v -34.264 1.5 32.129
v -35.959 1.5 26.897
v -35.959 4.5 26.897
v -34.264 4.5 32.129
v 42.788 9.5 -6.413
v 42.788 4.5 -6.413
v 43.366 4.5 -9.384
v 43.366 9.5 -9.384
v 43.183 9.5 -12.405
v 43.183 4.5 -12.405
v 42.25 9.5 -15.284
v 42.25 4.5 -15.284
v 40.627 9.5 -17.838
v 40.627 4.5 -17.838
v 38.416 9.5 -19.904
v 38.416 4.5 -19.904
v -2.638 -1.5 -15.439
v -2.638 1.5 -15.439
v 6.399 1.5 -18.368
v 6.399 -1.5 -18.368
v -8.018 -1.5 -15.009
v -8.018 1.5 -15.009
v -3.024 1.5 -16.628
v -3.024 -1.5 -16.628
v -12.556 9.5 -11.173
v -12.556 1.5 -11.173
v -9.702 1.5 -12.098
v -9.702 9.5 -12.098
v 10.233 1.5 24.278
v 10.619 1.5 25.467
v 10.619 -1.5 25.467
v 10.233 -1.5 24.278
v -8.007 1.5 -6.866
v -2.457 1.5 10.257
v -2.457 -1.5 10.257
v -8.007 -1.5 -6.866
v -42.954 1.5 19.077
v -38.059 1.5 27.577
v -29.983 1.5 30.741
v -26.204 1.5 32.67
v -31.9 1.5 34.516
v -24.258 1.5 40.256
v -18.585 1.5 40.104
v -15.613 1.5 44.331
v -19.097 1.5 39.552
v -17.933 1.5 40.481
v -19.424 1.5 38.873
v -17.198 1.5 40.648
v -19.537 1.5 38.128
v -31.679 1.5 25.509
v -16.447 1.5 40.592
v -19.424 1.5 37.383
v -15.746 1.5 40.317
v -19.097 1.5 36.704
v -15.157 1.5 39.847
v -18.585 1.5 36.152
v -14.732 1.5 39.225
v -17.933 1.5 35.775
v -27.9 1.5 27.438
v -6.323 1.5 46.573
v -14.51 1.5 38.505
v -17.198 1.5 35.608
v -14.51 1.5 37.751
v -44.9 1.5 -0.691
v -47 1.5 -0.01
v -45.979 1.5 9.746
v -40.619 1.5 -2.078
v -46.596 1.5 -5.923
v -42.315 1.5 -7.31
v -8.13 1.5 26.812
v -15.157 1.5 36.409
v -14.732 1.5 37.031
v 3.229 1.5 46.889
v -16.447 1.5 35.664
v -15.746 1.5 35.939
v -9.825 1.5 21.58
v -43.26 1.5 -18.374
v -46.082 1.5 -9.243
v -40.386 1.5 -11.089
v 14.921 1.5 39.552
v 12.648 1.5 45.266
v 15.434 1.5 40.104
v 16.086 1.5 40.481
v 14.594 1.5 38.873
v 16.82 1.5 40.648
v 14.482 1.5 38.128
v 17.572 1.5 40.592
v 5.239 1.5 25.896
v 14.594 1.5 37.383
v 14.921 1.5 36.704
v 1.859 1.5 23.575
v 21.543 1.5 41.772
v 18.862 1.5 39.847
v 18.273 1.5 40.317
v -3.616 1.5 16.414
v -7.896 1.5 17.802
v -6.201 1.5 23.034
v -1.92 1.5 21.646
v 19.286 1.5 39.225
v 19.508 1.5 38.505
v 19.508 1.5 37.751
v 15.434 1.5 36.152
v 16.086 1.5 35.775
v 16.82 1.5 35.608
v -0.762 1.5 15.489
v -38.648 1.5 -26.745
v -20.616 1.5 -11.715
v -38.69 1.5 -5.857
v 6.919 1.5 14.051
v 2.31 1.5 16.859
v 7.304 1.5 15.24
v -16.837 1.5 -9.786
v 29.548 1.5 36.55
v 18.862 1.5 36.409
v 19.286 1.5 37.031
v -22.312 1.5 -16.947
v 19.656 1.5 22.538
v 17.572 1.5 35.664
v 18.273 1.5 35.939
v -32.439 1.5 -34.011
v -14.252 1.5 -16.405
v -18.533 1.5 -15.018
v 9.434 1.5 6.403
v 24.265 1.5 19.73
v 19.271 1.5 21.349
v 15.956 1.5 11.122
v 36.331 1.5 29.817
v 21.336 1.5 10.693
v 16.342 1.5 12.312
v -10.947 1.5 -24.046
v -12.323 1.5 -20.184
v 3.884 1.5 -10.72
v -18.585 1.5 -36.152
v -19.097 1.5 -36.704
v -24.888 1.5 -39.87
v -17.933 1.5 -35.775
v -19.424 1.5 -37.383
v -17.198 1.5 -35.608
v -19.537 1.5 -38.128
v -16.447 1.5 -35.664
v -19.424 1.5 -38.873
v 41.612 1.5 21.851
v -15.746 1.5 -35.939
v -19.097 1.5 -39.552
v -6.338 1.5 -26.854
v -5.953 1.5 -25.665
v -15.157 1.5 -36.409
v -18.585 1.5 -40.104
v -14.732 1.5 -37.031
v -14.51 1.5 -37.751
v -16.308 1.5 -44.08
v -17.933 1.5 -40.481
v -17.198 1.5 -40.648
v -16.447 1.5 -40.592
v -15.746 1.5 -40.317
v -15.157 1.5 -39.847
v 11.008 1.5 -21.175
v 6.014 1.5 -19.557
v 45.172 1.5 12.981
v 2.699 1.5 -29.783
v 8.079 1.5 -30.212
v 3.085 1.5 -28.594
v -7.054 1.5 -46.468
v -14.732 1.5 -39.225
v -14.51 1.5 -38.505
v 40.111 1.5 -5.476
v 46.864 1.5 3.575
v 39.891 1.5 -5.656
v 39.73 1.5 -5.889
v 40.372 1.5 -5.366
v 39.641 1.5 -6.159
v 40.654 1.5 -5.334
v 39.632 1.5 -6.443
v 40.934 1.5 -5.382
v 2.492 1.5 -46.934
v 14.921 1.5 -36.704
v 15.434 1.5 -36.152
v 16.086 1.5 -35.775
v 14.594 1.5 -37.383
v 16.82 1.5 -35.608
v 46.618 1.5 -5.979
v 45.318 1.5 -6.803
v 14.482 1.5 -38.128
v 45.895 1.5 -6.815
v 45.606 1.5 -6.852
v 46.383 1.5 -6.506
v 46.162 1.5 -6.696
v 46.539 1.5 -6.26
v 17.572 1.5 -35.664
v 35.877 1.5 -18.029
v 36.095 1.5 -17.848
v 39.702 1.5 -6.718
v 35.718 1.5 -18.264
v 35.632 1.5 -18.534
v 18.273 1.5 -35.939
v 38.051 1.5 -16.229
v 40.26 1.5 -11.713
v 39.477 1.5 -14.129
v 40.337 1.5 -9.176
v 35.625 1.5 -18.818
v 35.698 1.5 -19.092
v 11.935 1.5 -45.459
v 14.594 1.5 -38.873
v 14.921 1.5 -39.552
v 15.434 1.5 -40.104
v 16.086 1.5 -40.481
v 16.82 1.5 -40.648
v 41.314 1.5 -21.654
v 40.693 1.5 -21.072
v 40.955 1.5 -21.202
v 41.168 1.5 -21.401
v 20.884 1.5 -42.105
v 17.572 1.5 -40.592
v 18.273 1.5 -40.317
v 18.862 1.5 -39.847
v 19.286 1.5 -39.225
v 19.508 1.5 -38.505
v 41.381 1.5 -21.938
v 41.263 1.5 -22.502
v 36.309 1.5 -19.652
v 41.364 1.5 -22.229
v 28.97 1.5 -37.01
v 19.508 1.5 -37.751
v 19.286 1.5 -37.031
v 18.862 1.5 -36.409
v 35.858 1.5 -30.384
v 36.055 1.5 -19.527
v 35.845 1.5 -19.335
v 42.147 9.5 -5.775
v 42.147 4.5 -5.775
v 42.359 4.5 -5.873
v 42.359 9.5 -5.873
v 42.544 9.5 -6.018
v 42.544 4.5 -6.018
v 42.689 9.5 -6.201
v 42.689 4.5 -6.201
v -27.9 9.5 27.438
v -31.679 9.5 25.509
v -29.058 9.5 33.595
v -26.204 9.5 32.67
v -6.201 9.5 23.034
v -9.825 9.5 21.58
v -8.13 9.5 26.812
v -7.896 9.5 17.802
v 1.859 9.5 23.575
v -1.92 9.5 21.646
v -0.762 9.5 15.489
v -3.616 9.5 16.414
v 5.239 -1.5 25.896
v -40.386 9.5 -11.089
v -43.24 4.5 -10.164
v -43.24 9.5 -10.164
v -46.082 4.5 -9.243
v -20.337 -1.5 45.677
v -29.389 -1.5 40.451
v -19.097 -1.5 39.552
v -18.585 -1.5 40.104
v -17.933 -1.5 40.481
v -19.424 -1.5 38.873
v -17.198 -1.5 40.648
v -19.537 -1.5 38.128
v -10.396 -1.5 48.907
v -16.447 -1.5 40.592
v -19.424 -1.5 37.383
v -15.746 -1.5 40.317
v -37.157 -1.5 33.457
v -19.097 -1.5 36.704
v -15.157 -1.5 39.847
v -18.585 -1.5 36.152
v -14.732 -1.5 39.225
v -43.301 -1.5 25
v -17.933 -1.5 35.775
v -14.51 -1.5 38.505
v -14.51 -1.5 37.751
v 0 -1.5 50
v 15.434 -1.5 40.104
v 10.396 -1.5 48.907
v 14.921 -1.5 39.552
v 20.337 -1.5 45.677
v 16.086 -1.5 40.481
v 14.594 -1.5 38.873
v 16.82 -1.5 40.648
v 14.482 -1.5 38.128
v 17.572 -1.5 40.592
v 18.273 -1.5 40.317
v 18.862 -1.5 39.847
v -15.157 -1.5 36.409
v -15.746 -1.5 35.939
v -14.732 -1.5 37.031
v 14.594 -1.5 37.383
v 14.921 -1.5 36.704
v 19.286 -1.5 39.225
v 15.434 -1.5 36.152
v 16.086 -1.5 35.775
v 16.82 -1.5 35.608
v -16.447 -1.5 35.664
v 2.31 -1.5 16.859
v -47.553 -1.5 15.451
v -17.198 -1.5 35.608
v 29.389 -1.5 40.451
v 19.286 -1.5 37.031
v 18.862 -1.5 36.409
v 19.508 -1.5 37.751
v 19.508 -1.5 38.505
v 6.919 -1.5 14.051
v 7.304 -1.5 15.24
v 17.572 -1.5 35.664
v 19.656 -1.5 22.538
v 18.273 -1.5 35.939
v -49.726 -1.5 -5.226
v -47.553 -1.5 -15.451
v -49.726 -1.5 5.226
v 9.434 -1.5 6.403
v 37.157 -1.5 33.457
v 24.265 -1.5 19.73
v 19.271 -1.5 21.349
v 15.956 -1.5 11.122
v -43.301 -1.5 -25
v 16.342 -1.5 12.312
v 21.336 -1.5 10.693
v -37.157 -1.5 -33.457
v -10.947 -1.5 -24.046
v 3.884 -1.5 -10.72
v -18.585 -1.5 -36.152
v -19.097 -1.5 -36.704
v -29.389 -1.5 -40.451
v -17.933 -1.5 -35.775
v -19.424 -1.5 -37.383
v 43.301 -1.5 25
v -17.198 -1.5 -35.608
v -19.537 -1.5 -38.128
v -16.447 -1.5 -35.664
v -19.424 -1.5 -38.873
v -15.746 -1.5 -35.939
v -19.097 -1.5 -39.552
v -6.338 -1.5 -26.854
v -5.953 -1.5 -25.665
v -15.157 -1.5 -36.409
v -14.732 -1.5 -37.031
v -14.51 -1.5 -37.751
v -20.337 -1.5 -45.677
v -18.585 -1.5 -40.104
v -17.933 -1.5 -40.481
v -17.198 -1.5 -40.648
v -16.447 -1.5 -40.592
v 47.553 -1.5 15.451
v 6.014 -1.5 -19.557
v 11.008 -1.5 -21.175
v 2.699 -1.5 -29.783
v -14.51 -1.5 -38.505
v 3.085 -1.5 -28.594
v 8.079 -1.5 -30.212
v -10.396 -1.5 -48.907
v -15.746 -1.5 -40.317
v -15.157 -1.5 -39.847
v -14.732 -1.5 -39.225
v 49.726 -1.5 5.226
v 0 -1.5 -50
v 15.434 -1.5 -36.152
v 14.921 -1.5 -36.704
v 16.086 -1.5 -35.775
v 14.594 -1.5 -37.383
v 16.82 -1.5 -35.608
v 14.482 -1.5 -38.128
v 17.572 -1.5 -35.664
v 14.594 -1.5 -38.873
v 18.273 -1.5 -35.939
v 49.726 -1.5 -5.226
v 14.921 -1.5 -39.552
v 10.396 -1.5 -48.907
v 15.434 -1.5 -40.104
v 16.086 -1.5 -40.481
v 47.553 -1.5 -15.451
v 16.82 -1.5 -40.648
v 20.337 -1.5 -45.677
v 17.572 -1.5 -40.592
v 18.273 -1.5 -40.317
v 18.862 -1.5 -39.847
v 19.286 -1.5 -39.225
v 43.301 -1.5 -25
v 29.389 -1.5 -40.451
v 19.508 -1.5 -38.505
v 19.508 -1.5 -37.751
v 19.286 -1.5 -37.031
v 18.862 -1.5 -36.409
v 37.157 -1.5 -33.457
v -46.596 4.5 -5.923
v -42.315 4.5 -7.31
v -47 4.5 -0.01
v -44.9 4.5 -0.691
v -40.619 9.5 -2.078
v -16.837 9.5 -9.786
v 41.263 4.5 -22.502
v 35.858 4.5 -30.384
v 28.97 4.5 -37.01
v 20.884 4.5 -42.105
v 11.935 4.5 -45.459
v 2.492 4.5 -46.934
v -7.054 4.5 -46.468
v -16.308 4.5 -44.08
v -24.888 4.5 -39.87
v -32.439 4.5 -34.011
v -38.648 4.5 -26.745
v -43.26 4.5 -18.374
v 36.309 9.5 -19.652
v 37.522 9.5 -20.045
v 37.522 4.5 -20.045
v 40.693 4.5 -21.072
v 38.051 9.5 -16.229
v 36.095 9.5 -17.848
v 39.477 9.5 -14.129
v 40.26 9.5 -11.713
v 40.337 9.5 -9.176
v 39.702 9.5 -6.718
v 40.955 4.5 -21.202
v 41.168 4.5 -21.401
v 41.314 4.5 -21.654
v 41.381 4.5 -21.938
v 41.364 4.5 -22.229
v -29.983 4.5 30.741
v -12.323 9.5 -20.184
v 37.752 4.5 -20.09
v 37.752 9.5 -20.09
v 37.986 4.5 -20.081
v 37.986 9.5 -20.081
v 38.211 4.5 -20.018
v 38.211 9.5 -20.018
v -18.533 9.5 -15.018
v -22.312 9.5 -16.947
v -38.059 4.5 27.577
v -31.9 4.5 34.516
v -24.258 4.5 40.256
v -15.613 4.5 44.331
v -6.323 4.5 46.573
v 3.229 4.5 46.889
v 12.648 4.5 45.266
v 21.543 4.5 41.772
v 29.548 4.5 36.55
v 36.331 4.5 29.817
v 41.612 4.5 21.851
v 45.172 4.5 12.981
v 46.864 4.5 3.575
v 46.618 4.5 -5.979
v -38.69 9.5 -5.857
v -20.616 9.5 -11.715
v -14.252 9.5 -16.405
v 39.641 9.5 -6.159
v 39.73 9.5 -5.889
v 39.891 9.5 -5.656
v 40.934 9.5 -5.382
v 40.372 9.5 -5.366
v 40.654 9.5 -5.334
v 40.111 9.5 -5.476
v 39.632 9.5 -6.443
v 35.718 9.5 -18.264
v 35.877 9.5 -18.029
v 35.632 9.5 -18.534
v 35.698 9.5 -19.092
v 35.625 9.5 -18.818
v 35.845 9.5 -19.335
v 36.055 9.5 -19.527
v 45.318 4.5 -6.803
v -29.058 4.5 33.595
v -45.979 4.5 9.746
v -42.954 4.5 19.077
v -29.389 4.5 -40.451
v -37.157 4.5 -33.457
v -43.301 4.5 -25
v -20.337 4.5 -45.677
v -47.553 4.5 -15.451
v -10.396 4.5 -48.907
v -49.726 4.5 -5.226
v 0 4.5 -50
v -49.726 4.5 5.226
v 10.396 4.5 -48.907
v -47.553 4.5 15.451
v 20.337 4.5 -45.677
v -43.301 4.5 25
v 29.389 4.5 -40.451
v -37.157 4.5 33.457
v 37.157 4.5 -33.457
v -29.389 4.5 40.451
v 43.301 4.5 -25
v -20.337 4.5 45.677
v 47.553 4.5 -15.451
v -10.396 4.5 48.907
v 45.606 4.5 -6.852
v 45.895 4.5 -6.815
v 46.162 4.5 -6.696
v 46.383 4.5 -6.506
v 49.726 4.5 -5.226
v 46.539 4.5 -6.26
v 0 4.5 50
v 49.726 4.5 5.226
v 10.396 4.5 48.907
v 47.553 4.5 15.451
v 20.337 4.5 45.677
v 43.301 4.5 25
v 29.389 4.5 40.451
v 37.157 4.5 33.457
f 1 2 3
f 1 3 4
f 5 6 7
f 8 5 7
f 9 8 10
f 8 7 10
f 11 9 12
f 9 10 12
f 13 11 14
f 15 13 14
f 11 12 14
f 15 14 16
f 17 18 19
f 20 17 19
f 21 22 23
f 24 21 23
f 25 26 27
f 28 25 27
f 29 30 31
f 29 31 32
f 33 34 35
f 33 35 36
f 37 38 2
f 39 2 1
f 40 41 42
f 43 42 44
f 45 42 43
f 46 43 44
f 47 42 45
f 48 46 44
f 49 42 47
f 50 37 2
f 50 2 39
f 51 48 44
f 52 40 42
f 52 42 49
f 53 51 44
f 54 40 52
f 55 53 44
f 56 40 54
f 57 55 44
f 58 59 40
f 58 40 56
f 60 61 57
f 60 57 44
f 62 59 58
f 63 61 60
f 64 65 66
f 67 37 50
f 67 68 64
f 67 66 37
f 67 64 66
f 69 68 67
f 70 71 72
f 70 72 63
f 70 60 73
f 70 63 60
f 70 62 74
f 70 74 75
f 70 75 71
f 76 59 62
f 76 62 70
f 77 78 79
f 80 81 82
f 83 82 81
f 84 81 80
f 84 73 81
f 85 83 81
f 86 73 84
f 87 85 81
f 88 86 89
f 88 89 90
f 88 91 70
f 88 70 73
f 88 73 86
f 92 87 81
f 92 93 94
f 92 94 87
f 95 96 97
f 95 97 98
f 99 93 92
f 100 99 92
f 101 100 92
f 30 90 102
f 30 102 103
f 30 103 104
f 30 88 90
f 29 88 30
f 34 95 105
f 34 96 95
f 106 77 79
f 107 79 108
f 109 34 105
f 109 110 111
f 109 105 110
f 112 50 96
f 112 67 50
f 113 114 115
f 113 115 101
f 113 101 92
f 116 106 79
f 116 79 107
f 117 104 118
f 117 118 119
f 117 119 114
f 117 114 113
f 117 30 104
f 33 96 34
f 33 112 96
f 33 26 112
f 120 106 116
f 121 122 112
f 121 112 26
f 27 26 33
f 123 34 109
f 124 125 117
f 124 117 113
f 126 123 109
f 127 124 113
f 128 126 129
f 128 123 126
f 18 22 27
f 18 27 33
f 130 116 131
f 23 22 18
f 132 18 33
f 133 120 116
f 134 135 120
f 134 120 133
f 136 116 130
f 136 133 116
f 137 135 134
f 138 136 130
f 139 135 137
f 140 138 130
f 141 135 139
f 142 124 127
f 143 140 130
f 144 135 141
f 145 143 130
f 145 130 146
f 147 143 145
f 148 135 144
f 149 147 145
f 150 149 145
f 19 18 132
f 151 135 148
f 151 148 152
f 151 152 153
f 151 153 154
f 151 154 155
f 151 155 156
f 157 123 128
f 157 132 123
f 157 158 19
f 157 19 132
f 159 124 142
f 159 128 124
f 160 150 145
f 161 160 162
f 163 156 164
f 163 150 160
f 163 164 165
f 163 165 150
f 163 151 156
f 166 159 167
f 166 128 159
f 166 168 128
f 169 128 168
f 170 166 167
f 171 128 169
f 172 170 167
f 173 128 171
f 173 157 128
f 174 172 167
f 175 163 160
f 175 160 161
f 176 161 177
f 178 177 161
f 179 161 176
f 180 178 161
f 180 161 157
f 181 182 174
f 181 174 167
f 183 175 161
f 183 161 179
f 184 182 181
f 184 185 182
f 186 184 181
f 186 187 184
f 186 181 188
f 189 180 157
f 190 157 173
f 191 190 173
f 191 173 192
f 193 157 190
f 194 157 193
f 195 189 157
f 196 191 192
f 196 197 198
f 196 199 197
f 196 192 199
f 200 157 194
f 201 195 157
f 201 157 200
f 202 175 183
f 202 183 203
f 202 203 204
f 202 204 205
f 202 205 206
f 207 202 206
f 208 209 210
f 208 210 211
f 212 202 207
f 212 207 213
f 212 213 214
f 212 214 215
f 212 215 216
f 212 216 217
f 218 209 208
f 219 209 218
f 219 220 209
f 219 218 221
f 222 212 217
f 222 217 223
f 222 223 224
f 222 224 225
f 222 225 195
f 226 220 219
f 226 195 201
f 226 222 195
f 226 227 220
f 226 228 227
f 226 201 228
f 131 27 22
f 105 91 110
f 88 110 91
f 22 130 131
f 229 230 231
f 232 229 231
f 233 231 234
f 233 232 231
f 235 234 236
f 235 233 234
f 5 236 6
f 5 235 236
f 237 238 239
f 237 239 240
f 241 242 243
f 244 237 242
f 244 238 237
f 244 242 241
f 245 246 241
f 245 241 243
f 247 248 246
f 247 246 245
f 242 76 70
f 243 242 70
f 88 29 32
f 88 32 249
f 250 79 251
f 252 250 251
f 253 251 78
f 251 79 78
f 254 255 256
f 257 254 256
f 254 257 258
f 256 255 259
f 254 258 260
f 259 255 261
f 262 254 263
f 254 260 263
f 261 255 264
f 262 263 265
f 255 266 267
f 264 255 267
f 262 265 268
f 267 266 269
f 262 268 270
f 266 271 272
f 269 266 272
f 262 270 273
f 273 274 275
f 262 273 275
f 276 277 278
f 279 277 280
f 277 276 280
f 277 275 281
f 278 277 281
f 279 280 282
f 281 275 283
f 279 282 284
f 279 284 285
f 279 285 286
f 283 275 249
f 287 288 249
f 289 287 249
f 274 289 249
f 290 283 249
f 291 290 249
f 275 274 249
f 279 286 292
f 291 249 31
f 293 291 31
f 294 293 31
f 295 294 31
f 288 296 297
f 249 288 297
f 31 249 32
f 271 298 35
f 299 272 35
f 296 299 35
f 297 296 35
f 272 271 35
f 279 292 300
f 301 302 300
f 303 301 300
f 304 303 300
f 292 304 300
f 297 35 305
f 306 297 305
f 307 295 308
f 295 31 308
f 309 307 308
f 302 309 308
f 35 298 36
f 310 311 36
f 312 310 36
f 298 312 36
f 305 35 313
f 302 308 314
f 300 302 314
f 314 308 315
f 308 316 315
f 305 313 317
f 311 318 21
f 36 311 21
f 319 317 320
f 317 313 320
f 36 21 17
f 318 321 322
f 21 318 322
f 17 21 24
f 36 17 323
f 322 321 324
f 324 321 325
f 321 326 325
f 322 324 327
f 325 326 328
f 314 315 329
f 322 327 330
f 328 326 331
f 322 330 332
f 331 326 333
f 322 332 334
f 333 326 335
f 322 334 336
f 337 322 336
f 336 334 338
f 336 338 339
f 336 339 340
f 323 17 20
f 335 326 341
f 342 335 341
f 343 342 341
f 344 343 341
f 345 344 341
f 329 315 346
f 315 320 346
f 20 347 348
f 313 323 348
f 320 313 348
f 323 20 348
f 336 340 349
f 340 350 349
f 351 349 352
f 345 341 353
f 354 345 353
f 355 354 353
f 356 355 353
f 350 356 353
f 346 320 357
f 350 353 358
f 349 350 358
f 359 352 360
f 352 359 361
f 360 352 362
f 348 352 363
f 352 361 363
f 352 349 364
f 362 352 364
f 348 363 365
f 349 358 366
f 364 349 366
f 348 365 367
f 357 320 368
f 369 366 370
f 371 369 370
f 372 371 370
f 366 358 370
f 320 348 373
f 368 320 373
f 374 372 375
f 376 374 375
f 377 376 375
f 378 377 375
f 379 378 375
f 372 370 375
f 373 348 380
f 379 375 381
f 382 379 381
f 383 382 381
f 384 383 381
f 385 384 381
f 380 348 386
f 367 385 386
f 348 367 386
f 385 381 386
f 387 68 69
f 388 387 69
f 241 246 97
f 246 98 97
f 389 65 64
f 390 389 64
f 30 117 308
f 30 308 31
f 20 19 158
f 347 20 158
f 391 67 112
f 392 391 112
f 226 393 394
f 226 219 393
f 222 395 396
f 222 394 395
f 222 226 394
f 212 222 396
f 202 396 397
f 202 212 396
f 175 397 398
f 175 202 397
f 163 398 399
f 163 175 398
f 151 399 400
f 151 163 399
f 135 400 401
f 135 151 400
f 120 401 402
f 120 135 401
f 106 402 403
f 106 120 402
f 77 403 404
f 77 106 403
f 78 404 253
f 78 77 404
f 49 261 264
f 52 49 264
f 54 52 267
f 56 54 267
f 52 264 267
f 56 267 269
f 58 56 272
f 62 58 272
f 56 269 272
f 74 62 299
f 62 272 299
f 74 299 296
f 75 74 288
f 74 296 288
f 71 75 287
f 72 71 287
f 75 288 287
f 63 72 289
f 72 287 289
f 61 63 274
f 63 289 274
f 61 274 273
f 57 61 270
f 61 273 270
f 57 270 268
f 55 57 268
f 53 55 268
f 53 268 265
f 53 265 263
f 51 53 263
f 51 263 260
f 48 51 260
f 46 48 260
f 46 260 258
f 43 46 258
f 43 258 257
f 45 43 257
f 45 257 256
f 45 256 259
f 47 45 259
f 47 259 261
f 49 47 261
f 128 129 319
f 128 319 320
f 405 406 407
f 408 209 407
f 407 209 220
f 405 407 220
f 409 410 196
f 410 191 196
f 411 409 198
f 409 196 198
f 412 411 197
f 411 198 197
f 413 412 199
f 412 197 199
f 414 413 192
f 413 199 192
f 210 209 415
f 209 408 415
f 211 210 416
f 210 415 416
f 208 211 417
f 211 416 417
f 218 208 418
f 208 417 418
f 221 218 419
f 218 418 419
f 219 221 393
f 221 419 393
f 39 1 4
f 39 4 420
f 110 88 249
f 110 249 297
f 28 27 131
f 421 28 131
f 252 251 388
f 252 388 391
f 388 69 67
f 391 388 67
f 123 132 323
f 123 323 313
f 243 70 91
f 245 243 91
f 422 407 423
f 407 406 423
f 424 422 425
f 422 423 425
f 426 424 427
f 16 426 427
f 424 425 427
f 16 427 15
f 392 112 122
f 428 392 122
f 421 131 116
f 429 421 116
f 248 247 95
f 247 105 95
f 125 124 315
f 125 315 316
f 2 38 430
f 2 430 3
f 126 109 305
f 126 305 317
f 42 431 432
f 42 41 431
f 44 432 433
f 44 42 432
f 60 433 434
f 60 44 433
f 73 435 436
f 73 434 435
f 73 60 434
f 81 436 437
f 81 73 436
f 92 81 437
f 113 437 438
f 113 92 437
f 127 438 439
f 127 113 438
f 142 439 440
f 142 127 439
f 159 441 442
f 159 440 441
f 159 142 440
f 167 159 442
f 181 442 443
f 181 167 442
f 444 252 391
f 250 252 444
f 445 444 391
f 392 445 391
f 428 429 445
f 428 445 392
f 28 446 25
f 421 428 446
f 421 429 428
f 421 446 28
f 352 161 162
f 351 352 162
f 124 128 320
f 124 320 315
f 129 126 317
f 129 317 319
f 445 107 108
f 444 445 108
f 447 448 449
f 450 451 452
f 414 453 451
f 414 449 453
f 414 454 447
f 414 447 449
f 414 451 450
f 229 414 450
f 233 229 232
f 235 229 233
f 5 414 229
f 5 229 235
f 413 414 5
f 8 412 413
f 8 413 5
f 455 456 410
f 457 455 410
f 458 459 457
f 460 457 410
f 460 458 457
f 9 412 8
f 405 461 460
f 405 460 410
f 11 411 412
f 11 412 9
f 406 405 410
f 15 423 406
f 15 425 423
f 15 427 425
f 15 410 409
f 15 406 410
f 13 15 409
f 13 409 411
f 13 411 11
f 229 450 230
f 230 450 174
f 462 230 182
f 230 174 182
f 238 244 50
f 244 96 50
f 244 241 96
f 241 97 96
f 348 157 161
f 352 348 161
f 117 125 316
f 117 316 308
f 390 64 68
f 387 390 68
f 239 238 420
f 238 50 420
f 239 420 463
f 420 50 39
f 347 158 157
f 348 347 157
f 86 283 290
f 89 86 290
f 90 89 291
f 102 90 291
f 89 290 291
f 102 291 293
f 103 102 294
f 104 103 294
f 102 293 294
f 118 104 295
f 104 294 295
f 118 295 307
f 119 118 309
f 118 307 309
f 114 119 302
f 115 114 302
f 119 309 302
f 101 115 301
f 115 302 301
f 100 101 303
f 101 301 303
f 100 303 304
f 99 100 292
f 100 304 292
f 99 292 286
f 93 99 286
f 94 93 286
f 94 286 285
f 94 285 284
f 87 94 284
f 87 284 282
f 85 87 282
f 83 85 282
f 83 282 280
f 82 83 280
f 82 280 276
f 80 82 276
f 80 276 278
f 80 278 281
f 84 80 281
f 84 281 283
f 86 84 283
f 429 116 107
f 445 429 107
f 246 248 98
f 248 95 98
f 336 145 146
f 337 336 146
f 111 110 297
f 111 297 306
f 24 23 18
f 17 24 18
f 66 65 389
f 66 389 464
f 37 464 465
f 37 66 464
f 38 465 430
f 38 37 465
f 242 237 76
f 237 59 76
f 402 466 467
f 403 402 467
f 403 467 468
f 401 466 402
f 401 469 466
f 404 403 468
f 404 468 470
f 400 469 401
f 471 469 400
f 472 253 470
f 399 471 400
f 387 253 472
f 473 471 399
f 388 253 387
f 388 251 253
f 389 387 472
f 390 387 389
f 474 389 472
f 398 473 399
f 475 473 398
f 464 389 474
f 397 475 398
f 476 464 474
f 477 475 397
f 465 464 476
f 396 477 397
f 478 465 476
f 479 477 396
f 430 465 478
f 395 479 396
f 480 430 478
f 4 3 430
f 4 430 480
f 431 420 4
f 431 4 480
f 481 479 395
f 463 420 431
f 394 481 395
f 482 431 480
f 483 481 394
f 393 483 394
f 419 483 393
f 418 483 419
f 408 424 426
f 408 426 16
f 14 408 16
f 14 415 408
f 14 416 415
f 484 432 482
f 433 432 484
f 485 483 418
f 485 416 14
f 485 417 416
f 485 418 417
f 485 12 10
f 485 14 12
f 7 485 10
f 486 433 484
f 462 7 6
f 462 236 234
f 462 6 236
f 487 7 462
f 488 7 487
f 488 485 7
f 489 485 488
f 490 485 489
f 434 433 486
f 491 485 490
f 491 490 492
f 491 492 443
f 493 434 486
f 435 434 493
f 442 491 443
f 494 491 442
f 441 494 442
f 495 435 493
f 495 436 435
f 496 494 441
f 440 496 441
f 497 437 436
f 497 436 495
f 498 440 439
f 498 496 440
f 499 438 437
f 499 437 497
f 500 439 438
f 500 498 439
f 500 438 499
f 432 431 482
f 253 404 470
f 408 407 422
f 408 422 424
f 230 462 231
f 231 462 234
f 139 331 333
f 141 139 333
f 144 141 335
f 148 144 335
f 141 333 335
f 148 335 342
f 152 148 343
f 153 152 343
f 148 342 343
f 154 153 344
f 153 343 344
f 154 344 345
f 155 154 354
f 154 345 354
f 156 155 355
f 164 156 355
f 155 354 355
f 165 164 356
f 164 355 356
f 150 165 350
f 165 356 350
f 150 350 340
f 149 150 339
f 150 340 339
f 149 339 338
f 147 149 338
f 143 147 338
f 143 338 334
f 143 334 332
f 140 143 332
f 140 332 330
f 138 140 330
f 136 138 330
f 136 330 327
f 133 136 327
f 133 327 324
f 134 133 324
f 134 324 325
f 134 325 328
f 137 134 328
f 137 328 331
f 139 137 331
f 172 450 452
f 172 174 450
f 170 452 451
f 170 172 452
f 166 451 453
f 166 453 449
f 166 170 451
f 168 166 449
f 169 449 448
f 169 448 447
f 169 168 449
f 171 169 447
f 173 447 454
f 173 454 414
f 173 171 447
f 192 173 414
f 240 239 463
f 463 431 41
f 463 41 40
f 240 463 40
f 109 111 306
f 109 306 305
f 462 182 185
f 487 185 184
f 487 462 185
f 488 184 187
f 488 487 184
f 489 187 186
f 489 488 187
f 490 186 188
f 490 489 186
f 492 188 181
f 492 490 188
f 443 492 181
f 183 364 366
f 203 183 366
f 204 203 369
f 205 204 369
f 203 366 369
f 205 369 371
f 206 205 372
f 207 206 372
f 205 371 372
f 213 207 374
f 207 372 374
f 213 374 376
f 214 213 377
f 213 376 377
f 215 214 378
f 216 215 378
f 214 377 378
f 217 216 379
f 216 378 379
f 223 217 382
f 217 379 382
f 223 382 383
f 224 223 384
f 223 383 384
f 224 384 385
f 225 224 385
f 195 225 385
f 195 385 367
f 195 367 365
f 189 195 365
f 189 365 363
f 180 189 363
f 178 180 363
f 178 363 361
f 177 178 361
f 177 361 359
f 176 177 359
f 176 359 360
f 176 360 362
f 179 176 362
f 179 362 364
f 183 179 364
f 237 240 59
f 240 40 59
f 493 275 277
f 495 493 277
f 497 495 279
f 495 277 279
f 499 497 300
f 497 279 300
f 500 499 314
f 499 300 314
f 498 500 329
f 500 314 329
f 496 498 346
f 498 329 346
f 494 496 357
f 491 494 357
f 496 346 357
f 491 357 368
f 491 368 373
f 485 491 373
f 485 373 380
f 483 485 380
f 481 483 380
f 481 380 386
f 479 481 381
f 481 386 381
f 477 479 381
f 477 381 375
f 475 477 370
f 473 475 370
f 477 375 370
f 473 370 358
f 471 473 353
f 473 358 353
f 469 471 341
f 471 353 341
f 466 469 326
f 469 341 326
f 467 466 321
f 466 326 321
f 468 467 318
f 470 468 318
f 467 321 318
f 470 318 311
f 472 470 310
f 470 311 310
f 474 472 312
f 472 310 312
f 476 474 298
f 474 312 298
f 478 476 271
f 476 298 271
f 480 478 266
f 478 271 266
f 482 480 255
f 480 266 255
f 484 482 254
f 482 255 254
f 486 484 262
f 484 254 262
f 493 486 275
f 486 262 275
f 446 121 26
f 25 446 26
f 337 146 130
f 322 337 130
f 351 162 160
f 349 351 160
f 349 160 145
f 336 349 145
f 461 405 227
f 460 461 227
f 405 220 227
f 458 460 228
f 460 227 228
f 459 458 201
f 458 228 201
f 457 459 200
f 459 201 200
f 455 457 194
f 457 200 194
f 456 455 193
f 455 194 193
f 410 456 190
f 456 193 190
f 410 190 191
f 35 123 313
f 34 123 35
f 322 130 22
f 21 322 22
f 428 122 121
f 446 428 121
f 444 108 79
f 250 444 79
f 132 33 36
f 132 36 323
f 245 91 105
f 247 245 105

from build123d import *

# Parameters (mm, degrees)
A_BASE_T_START                 = -1.5
A_BASE_T_OUTLINE_R             = 47
A_BASE_T_OUTLINE_R_2           = 1
A_BASE_T_DEPTH                 = 3
OUTER_RING_DEPTH               = 3
OUTER_RING_DEPTH_BACK          = 3
SKETCH1_R                      = 50
SKETCH1_R_2                    = 47.000000000000014
SERVO_FRAME_DEPTH              = 3
PATCHING_START                 = -3
SKETCH4_R                      = 1.000000000000005
SKETCH4_R_2                    = 0.9999999999999875
SKETCH4_R_3                    = 1.0000000000000018
PATCHING_DEPTH                 = 3
BOTTOM_HOLES_DEPTH             = 71.77428911688199
SERVO_FRAME_EXTENSION_DEPTH    = 5
F_8_0_199_DIAMETER_HOLE1_D     = 5.0546
F_8_0_199_DIAMETER_HOLE1_DEPTH = 10
F_8_0_199_DIAMETER_HOLE1_TIP   = 1.5185550424683532
SHELL_TAB_DEPTH                = 3
SHELL_TAB_EXTENSION_DEPTH      = 5
CONTOURING_R                   = 1


# Read off the part's stored shape, not the designer's step: a_base_t
with BuildPart() as part:
    # a_base_t outline → a_base_t (new body)
    with BuildSketch(Plane(origin=(0, 0, 0), x_dir=(1, 0, 0), z_dir=(0, 1, 0)).offset(A_BASE_T_START)):
        Circle(A_BASE_T_OUTLINE_R)
        with Locations((-17.009259258, -38.128042167)):
            Circle(A_BASE_T_OUTLINE_R_2, mode=Mode.SUBTRACT)
        with Locations((-9.166666665, -28.284271247)):
            Circle(A_BASE_T_OUTLINE_R_2, mode=Mode.SUBTRACT)
        with Locations((17.009259258, -38.128042167)):
            Circle(A_BASE_T_OUTLINE_R_2, mode=Mode.SUBTRACT)
        with Locations((27.5, -28.284271247)):
            Circle(A_BASE_T_OUTLINE_R_2, mode=Mode.SUBTRACT)
        with Locations((-27.5, 28.284271247)):
            Circle(A_BASE_T_OUTLINE_R_2, mode=Mode.SUBTRACT)
        with Locations((-17.009259258, 38.128042167)):
            Circle(A_BASE_T_OUTLINE_R_2, mode=Mode.SUBTRACT)
        with Locations((9.166666665, 28.284271247)):
            Circle(A_BASE_T_OUTLINE_R_2, mode=Mode.SUBTRACT)
        with Locations((17.009259258, 38.128042167)):
            Circle(A_BASE_T_OUTLINE_R_2, mode=Mode.SUBTRACT)
    extrude(amount=A_BASE_T_DEPTH)

    # Sketch1 → Outer Ring (add, two sides: drawn at the far end of the back side and taken through both)
    with BuildSketch(Plane(origin=(0, 1.5, 0), x_dir=(1, 0, 0), z_dir=(0, 1, 0)).offset(-OUTER_RING_DEPTH_BACK)):
        with Locations(Location((0, 0, 0), (0, 0, 270))):
            Circle(SKETCH1_R)
        with Locations(Location((0, 0, 0), (0, 0, 270))):
            Circle(SKETCH1_R_2, mode=Mode.SUBTRACT)
    extrude(amount=OUTER_RING_DEPTH + OUTER_RING_DEPTH_BACK)

    # Sketch2 → Servo Frame (add)
    with BuildSketch(Plane(origin=(0, 1.5, 0), x_dir=(1, 0, 0), z_dir=(0, 1, 0))):
        with BuildLine():
            Line((-38.0591968031926, -27.57711984047382), (-35.959340758040334, -26.89657621793413))
            Line((-35.959340758040334, -26.89657621793413), (-34.26367139752046, -32.128660450798996))
            Line((-34.26367139752046, -32.128660450798996), (-29.982875206994592, -30.74129461037364))
            Line((-29.982875206994592, -30.74129461037364), (-31.678544567514475, -25.509210377508683))
            Line((-31.678544567514475, -25.509210377508683), (-7.896343509037404, -17.801622375145534))
            Line((-7.896343509037404, -17.801622375145534), (-6.200674148517496, -23.033706608010526))
            Line((-6.200674148517496, -23.033706608010526), (-1.9198779579916272, -21.64634076758515))
            Line((-1.9198779579916272, -21.64634076758515), (-3.6155473185115334, -16.414256534720167))
            Line((-3.6155473185115334, -16.414256534720167), (-0.7616831914942761, -15.489345974436619))
            Line((-0.7616831914942761, -15.489345974436619), (1.8588967293091871, -23.57529433431882))
            Line((1.8588967293091871, -23.57529433431882), (-8.1296277152512, -26.812481295311326))
            Line((-8.1296277152512, -26.812481295311326), (-9.825297075771067, -21.580397062446362))
            Line((-9.825297075771067, -21.580397062446362), (-27.89976988021365, -27.438163944242362))
            Line((-27.89976988021365, -27.438163944242362), (-26.20410051969376, -32.670248177107304))
            Line((-26.20410051969376, -32.670248177107304), (-31.900225974204588, -34.516308939321476))
            ThreePointArc((-31.900225974204588, -34.516308939321476), (-35.15136263609195, -31.199065768480295), (-38.0591968031926, -27.57711984047382))
        make_face()
        with BuildLine():
            Line((-12.323065195039092, 20.183955613279007), (-22.311589639599458, 16.946768652286423))
            Line((-22.311589639599458, 16.946768652286423), (-20.615920279079525, 11.714684419421493))
            Line((-20.615920279079525, 11.714684419421493), (-38.690393083522096, 5.856917537625489))
            Line((-38.690393083522096, 5.856917537625489), (-40.38606244404183, 11.089001770490507))
            Line((-40.38606244404183, 11.089001770490507), (-46.08218789855281, 9.242941008276162))
            ThreePointArc((-46.08218789855281, 9.242941008276162), (-46.769478259318326, 4.649290628811158), (-46.999998885933856, 0.01023338735953519))
            Line((-46.999998885933856, 0.01023338735953519), (-44.90014284078164, 0.6907770098992967))
            Line((-44.90014284078164, 0.6907770098992967), (-46.595812201301534, 5.922861242764241))
            Line((-46.595812201301534, 5.922861242764241), (-42.31501601077568, 7.31022708318961))
            Line((-42.31501601077568, 7.31022708318961), (-40.61934665025577, 2.0781428503246593))
            Line((-40.61934665025577, 2.0781428503246593), (-16.8371455917787, 9.785730852687836))
            Line((-16.8371455917787, 9.785730852687836), (-18.53281495229861, 15.017815085552826))
            Line((-18.53281495229861, 15.017815085552826), (-14.252018761772744, 16.405180925978193))
            Line((-14.252018761772744, 16.405180925978193), (-12.556349401252827, 11.173096693113212))
            Line((-12.556349401252827, 11.173096693113212), (-9.702485274235583, 12.09800725339679))
            Line((-9.702485274235583, 12.09800725339679), (-12.323065195039092, 20.183955613279007))
        make_face()
    extrude(amount=SERVO_FRAME_DEPTH)

    # Sketch4 → Patching (add)
    with BuildSketch(Plane(origin=(0, 1.5, 0), x_dir=(1, 0, 0), z_dir=(0, 1, 0)).offset(PATCHING_START)):
        with Locations((-9.166666664999994, -28.284271247461895)):
            Circle(SKETCH4_R)
        with Locations((27.499999999999897, -28.284271247461895)):
            Circle(SKETCH4_R_2)
        with Locations((-27.499999999999897, 28.284271247461895)):
            Circle(SKETCH4_R_3)
        with Locations((9.166666664999994, 28.284271247461895)):
            Circle(SKETCH4_R)
    extrude(amount=PATCHING_DEPTH)

    # Sketch3 → Bottom Holes (cut, through all)
    with BuildSketch(Plane(origin=(0, 1.5, 0), x_dir=(1, 0, 0), z_dir=(0, 1, 0))):
        Polygon((-2.4573525520141377, -10.257261741571627), (-8.006815913715702, 6.865923020531821), (3.8842846155226813, 10.719717021713405), (9.43374797722423, -6.403467740390065), align=None)
        Polygon((11.007812758181103, 21.175234550786502), (8.078929317282705, 30.212470953007827), (3.084667095002796, 28.593877472511632), (2.6992876948846334, 29.78298752543549), (-6.337948707336641, 26.854104084537454), (-5.952569307218477, 25.6649940316136), (-10.9468315294987, 24.046400551117266), (-8.017948088600651, 15.009164148896), (-3.023685866320578, 16.62775762939225), (-2.6383064662022653, 15.438647576468425), (6.398929936019005, 18.36753101736646), (6.01355053590084, 19.55664107029031), align=None)
        Polygon((19.270601899965627, -21.348744750290177), (19.65598130008379, -22.53785480321403), (10.618744897862516, -25.46673824411206), (10.233365497744353, -24.27762819118821), (5.239103275464198, -25.89622167168446), (2.3102198345661495, -16.85898526946319), (7.304482056846301, -15.240391788966894), (6.9191026567281435, -14.051281736043038), (15.95633905894941, -11.122398295145004), (16.34171845906757, -12.31150834806886), (21.335980681347763, -10.692914867572457), (24.2648641222456, -19.7301512697939), align=None)
    extrude(amount=-BOTTOM_HOLES_DEPTH, mode=Mode.SUBTRACT)

    # Sketch8 → Servo Frame Extension (add)
    with BuildSketch(Plane(origin=(0, 4.500000000000001, 0), x_dir=(1, 0, 0), z_dir=(0, 1, 0))):
        Polygon((1.8588967293091865, -23.57529433431882), (-0.7616831914942761, -15.489345974436619), (-3.6155473185115334, -16.414256534720167), (-1.9198779579916272, -21.64634076758515), (-6.200674148517496, -23.033706608010526), (-7.896343509037404, -17.801622375145534), (-31.678544567514475, -25.509210377508683), (-29.982875206994592, -30.74129461037364), (-29.057964646711014, -33.59515873739088), (-26.20410051969376, -32.670248177107304), (-27.89976988021365, -27.438163944242362), (-9.825297075771067, -21.580397062446362), (-8.1296277152512, -26.812481295311326), align=None)
        Polygon((-40.38606244404183, 11.089001770490507), (-43.23992657105916, 10.164091210206845), (-42.31501601077568, 7.31022708318961), (-40.61934665025577, 2.0781428503246593), (-16.837145591778697, 9.785730852687836), (-18.53281495229861, 15.017815085552826), (-14.252018761772744, 16.405180925978193), (-12.556349401252827, 11.173096693113212), (-9.702485274235583, 12.09800725339679), (-12.323065195039092, 20.183955613279007), (-22.311589639599458, 16.946768652286423), (-20.615920279079525, 11.714684419421493), (-38.690393083522096, 5.856917537625489), align=None)
    extrude(amount=SERVO_FRAME_EXTENSION_DEPTH)

    # #8 (0.199) Diameter Hole1
    with Locations(Plane(origin=(0, 1.5, 0), x_dir=(1, 0, 0), z_dir=(0, 1, 0))):
        with Locations((17.009259258, -38.128042167), (17.009259258, 38.128042167), (-17.009259258, 38.128042167), (-17.009259258, -38.128042167)):
            Hole(F_8_0_199_DIAMETER_HOLE1_D / 2, depth=F_8_0_199_DIAMETER_HOLE1_DEPTH)
            with Locations((0, 0, -(F_8_0_199_DIAMETER_HOLE1_DEPTH + F_8_0_199_DIAMETER_HOLE1_TIP / 2))):  # 118° drill point
                Cone(0, F_8_0_199_DIAMETER_HOLE1_D / 2, F_8_0_199_DIAMETER_HOLE1_TIP, mode=Mode.SUBTRACT)

    # Sketch21 → Shell Tab (add)
    with BuildSketch(Plane(origin=(0, 1.5, 0), x_dir=(1, 0, 0), z_dir=(0, 1, 0))):
        with BuildLine():
            Line((38.43738005388435, 4.573146492125436), (46.4498888135124, 7.169925328225916))
            ThreePointArc((46.4498888135124, 7.169925328225916), (44.71053798993682, 14.490265444442931), (41.825336012094446, 21.439245963312132))
            Line((41.825336012094446, 21.439245963312132), (33.81282725246639, 18.842467127211638))
            ThreePointArc((33.81282725246639, 18.842467127211638), (39.954097778241405, 12.948747843970278), (38.43738005388435, 4.573146492125436))
        make_face()
    extrude(amount=SHELL_TAB_DEPTH)

    # Sketch22 → Shell Tab Extension (add)
    with BuildSketch(Plane(origin=(0, 4.500000000000001, 0), x_dir=(1, 0, 0), z_dir=(0, 1, 0))):
        with BuildLine():
            Line((38.43738005388435, 4.573146492125436), (42.61596967836049, 5.927388144410685))
            ThreePointArc((42.61596967836049, 5.927388144410685), (42.80796190525865, 13.873658404253868), (37.99141687694254, 20.19670877949689))
            Line((37.99141687694254, 20.19670877949689), (33.81282725246639, 18.842467127211638))
            ThreePointArc((33.81282725246639, 18.842467127211638), (39.954097778241405, 12.948747843970278), (38.43738005388435, 4.573146492125436))
        make_face()
    extrude(amount=SHELL_TAB_EXTENSION_DEPTH)

    # Contouring
    contouring_edges = [part.edges().sort_by_distance(p)[0] for p in [
        (33.81282725246639, 5.5, -18.84246712721164),
        (38.43738005388435, 5.5, -4.573146492125435),
        (46.44988881351241, 3, -7.169925328225917),
        (41.82533601209445, 3, -21.439245963312132),
        (42.61596967836049, 7.000000000000001, -5.927388144410685),
        (37.99141687694254, 7.000000000000001, -20.19670877949689),
    ]]
    fillet(contouring_edges, radius=CONTOURING_R)


solid = part.part
